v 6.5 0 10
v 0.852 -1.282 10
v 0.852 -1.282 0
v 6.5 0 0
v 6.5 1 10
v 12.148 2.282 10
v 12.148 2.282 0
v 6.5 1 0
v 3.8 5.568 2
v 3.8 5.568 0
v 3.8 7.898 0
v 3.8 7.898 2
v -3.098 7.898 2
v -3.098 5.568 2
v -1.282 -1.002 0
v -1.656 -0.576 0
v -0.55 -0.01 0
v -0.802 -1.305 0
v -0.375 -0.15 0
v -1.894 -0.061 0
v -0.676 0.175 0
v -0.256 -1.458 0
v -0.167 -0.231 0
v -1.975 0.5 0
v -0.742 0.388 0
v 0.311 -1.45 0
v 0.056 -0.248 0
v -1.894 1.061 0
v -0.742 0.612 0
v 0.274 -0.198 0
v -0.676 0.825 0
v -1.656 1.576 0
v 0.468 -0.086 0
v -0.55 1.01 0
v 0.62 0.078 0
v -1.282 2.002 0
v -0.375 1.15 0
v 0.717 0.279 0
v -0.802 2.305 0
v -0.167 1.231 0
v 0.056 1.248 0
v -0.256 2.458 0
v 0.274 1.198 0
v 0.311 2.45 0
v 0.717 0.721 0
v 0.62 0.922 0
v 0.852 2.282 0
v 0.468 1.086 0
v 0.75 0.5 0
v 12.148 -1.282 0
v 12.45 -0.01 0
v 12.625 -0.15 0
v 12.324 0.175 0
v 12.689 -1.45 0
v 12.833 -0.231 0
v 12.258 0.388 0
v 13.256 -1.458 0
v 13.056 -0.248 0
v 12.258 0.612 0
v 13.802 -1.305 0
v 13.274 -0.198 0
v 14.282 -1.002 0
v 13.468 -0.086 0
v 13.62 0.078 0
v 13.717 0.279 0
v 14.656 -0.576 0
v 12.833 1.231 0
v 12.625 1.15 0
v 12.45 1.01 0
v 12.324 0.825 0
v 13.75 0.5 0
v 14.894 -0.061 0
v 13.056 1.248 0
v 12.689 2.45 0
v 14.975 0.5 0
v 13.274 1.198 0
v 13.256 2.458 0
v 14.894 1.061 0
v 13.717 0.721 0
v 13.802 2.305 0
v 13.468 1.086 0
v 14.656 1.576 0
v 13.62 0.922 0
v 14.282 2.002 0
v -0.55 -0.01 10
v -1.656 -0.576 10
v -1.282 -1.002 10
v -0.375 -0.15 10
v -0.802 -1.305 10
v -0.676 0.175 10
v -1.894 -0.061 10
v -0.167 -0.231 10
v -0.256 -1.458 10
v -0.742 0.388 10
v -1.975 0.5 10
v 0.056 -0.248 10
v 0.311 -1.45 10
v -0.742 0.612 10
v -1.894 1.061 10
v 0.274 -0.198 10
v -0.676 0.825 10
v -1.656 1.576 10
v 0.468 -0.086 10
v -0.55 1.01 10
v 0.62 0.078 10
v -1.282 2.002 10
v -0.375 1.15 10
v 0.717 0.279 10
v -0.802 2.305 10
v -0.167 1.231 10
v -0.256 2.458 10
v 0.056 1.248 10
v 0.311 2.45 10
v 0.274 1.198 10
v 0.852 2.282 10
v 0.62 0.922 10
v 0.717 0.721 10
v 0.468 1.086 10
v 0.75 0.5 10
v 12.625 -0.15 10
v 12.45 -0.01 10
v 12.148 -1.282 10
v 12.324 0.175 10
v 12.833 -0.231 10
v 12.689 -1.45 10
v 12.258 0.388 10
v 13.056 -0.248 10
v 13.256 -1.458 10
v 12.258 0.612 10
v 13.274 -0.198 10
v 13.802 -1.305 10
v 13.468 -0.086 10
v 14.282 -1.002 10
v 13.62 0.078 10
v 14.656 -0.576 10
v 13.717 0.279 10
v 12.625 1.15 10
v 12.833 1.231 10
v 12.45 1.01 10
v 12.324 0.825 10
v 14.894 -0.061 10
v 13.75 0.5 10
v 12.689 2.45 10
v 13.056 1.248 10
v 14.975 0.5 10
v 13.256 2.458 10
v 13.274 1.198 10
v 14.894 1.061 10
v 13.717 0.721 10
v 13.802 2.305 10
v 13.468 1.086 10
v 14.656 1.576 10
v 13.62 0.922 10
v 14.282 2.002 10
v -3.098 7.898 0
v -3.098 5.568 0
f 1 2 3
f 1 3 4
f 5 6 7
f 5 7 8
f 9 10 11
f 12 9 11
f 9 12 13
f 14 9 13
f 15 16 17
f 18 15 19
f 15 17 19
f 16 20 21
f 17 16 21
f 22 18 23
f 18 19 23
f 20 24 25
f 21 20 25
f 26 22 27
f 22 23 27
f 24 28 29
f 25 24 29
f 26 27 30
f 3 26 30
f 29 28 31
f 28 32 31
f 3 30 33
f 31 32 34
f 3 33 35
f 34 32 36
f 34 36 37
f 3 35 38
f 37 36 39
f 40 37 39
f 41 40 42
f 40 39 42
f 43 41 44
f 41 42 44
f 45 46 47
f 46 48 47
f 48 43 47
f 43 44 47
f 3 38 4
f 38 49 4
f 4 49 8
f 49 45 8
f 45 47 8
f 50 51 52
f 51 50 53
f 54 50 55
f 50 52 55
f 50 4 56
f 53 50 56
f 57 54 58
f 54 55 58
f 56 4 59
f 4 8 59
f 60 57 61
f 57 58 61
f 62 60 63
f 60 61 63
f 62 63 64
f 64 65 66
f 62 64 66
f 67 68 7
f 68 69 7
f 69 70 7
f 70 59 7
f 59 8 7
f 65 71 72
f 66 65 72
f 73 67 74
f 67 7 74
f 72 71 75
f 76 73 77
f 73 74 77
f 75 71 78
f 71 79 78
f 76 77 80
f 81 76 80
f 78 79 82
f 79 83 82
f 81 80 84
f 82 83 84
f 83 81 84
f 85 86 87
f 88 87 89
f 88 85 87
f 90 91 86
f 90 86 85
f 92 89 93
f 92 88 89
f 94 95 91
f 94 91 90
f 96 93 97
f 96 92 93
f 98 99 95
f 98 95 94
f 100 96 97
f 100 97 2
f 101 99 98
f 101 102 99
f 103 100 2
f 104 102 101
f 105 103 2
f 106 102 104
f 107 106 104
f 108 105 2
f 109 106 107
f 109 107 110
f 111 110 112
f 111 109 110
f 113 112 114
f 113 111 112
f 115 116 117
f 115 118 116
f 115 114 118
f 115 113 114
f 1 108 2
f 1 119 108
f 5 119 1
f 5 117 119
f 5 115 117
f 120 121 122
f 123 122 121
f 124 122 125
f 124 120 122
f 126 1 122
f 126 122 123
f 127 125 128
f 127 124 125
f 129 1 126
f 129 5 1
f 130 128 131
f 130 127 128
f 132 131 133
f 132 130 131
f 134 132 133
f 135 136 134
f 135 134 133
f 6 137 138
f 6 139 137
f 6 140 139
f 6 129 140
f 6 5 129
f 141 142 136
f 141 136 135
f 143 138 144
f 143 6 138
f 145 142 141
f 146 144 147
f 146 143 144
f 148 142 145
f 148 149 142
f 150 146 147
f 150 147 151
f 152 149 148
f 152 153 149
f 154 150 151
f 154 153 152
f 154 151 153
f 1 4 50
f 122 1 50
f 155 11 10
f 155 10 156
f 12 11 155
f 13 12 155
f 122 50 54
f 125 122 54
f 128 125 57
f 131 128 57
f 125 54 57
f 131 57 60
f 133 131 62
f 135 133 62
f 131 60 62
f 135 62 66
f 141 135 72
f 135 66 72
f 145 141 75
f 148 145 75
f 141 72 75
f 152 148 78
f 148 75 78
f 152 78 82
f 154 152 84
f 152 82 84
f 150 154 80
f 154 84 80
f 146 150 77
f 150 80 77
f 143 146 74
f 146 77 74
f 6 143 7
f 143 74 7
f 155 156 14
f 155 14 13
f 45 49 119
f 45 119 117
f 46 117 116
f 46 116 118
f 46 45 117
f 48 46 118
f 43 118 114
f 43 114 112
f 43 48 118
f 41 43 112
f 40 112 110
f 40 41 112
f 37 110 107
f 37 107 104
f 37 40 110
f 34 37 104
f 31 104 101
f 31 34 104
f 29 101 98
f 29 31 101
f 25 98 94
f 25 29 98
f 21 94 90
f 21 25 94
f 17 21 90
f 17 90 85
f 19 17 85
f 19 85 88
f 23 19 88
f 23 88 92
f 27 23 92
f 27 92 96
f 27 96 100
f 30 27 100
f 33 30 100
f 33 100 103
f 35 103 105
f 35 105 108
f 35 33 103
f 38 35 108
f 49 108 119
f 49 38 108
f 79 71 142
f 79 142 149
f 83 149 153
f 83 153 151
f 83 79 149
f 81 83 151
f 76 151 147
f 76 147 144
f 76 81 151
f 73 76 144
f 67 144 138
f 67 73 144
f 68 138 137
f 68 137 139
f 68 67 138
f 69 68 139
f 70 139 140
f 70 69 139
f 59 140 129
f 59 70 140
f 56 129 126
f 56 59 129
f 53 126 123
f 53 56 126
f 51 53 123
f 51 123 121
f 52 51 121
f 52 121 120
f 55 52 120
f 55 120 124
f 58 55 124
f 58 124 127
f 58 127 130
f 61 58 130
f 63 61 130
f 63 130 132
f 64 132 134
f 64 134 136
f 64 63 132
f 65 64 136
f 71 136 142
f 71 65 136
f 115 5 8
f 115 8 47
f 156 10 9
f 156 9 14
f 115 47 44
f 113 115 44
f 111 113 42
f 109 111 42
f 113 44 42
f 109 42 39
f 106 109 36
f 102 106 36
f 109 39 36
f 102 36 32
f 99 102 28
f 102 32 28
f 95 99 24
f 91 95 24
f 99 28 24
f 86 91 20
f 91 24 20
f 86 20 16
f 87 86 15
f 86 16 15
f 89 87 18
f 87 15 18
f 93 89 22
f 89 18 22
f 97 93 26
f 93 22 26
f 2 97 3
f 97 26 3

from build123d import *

# Parameters (mm, degrees)
SKETCH1_R           = 0.75
BOSS_EXTRUDE1_DEPTH = 10
SKETCH3_W           = 6.897403567
SKETCH3_H           = 2.329912157
BOSS_EXTRUDE3_DEPTH = 2


with BuildPart() as part:
    # Sketch1 → Boss-Extrude1 (new body)
    with BuildSketch(Plane.XY):
        with BuildLine():
            Line((12.147549978, 2.281559418), (6.5, 1))
            Line((6.5, 1), (0.852450022, 2.281559418))
            ThreePointArc((0.852450022, 2.281559418), (-1.975, 0.5), (0.852450022, -1.281559418))
            Line((0.852450022, -1.281559418), (6.5, 0))
            Line((6.5, 0), (12.147549978, -1.281559418))
            ThreePointArc((12.147549978, -1.281559418), (14.975, 0.5), (12.147549978, 2.281559418))
        make_face()
        with Locations((0, 0.5)):
            Circle(SKETCH1_R, mode=Mode.SUBTRACT)
        with Locations((13, 0.5)):
            Circle(SKETCH1_R, mode=Mode.SUBTRACT)
    extrude(amount=BOSS_EXTRUDE1_DEPTH)


with BuildPart() as body_2:
    # Sketch3 → Boss-Extrude3 (new body)
    with BuildSketch(Plane(origin=(0, 0, 0), x_dir=(-1, 0, 0), z_dir=(0, 0, -1))):
        with Locations((-0.350841319, 6.733030307)):
            Rectangle(SKETCH3_W, SKETCH3_H)
    extrude(amount=-BOSS_EXTRUDE3_DEPTH)


solid = Compound([part.part, body_2.part])
